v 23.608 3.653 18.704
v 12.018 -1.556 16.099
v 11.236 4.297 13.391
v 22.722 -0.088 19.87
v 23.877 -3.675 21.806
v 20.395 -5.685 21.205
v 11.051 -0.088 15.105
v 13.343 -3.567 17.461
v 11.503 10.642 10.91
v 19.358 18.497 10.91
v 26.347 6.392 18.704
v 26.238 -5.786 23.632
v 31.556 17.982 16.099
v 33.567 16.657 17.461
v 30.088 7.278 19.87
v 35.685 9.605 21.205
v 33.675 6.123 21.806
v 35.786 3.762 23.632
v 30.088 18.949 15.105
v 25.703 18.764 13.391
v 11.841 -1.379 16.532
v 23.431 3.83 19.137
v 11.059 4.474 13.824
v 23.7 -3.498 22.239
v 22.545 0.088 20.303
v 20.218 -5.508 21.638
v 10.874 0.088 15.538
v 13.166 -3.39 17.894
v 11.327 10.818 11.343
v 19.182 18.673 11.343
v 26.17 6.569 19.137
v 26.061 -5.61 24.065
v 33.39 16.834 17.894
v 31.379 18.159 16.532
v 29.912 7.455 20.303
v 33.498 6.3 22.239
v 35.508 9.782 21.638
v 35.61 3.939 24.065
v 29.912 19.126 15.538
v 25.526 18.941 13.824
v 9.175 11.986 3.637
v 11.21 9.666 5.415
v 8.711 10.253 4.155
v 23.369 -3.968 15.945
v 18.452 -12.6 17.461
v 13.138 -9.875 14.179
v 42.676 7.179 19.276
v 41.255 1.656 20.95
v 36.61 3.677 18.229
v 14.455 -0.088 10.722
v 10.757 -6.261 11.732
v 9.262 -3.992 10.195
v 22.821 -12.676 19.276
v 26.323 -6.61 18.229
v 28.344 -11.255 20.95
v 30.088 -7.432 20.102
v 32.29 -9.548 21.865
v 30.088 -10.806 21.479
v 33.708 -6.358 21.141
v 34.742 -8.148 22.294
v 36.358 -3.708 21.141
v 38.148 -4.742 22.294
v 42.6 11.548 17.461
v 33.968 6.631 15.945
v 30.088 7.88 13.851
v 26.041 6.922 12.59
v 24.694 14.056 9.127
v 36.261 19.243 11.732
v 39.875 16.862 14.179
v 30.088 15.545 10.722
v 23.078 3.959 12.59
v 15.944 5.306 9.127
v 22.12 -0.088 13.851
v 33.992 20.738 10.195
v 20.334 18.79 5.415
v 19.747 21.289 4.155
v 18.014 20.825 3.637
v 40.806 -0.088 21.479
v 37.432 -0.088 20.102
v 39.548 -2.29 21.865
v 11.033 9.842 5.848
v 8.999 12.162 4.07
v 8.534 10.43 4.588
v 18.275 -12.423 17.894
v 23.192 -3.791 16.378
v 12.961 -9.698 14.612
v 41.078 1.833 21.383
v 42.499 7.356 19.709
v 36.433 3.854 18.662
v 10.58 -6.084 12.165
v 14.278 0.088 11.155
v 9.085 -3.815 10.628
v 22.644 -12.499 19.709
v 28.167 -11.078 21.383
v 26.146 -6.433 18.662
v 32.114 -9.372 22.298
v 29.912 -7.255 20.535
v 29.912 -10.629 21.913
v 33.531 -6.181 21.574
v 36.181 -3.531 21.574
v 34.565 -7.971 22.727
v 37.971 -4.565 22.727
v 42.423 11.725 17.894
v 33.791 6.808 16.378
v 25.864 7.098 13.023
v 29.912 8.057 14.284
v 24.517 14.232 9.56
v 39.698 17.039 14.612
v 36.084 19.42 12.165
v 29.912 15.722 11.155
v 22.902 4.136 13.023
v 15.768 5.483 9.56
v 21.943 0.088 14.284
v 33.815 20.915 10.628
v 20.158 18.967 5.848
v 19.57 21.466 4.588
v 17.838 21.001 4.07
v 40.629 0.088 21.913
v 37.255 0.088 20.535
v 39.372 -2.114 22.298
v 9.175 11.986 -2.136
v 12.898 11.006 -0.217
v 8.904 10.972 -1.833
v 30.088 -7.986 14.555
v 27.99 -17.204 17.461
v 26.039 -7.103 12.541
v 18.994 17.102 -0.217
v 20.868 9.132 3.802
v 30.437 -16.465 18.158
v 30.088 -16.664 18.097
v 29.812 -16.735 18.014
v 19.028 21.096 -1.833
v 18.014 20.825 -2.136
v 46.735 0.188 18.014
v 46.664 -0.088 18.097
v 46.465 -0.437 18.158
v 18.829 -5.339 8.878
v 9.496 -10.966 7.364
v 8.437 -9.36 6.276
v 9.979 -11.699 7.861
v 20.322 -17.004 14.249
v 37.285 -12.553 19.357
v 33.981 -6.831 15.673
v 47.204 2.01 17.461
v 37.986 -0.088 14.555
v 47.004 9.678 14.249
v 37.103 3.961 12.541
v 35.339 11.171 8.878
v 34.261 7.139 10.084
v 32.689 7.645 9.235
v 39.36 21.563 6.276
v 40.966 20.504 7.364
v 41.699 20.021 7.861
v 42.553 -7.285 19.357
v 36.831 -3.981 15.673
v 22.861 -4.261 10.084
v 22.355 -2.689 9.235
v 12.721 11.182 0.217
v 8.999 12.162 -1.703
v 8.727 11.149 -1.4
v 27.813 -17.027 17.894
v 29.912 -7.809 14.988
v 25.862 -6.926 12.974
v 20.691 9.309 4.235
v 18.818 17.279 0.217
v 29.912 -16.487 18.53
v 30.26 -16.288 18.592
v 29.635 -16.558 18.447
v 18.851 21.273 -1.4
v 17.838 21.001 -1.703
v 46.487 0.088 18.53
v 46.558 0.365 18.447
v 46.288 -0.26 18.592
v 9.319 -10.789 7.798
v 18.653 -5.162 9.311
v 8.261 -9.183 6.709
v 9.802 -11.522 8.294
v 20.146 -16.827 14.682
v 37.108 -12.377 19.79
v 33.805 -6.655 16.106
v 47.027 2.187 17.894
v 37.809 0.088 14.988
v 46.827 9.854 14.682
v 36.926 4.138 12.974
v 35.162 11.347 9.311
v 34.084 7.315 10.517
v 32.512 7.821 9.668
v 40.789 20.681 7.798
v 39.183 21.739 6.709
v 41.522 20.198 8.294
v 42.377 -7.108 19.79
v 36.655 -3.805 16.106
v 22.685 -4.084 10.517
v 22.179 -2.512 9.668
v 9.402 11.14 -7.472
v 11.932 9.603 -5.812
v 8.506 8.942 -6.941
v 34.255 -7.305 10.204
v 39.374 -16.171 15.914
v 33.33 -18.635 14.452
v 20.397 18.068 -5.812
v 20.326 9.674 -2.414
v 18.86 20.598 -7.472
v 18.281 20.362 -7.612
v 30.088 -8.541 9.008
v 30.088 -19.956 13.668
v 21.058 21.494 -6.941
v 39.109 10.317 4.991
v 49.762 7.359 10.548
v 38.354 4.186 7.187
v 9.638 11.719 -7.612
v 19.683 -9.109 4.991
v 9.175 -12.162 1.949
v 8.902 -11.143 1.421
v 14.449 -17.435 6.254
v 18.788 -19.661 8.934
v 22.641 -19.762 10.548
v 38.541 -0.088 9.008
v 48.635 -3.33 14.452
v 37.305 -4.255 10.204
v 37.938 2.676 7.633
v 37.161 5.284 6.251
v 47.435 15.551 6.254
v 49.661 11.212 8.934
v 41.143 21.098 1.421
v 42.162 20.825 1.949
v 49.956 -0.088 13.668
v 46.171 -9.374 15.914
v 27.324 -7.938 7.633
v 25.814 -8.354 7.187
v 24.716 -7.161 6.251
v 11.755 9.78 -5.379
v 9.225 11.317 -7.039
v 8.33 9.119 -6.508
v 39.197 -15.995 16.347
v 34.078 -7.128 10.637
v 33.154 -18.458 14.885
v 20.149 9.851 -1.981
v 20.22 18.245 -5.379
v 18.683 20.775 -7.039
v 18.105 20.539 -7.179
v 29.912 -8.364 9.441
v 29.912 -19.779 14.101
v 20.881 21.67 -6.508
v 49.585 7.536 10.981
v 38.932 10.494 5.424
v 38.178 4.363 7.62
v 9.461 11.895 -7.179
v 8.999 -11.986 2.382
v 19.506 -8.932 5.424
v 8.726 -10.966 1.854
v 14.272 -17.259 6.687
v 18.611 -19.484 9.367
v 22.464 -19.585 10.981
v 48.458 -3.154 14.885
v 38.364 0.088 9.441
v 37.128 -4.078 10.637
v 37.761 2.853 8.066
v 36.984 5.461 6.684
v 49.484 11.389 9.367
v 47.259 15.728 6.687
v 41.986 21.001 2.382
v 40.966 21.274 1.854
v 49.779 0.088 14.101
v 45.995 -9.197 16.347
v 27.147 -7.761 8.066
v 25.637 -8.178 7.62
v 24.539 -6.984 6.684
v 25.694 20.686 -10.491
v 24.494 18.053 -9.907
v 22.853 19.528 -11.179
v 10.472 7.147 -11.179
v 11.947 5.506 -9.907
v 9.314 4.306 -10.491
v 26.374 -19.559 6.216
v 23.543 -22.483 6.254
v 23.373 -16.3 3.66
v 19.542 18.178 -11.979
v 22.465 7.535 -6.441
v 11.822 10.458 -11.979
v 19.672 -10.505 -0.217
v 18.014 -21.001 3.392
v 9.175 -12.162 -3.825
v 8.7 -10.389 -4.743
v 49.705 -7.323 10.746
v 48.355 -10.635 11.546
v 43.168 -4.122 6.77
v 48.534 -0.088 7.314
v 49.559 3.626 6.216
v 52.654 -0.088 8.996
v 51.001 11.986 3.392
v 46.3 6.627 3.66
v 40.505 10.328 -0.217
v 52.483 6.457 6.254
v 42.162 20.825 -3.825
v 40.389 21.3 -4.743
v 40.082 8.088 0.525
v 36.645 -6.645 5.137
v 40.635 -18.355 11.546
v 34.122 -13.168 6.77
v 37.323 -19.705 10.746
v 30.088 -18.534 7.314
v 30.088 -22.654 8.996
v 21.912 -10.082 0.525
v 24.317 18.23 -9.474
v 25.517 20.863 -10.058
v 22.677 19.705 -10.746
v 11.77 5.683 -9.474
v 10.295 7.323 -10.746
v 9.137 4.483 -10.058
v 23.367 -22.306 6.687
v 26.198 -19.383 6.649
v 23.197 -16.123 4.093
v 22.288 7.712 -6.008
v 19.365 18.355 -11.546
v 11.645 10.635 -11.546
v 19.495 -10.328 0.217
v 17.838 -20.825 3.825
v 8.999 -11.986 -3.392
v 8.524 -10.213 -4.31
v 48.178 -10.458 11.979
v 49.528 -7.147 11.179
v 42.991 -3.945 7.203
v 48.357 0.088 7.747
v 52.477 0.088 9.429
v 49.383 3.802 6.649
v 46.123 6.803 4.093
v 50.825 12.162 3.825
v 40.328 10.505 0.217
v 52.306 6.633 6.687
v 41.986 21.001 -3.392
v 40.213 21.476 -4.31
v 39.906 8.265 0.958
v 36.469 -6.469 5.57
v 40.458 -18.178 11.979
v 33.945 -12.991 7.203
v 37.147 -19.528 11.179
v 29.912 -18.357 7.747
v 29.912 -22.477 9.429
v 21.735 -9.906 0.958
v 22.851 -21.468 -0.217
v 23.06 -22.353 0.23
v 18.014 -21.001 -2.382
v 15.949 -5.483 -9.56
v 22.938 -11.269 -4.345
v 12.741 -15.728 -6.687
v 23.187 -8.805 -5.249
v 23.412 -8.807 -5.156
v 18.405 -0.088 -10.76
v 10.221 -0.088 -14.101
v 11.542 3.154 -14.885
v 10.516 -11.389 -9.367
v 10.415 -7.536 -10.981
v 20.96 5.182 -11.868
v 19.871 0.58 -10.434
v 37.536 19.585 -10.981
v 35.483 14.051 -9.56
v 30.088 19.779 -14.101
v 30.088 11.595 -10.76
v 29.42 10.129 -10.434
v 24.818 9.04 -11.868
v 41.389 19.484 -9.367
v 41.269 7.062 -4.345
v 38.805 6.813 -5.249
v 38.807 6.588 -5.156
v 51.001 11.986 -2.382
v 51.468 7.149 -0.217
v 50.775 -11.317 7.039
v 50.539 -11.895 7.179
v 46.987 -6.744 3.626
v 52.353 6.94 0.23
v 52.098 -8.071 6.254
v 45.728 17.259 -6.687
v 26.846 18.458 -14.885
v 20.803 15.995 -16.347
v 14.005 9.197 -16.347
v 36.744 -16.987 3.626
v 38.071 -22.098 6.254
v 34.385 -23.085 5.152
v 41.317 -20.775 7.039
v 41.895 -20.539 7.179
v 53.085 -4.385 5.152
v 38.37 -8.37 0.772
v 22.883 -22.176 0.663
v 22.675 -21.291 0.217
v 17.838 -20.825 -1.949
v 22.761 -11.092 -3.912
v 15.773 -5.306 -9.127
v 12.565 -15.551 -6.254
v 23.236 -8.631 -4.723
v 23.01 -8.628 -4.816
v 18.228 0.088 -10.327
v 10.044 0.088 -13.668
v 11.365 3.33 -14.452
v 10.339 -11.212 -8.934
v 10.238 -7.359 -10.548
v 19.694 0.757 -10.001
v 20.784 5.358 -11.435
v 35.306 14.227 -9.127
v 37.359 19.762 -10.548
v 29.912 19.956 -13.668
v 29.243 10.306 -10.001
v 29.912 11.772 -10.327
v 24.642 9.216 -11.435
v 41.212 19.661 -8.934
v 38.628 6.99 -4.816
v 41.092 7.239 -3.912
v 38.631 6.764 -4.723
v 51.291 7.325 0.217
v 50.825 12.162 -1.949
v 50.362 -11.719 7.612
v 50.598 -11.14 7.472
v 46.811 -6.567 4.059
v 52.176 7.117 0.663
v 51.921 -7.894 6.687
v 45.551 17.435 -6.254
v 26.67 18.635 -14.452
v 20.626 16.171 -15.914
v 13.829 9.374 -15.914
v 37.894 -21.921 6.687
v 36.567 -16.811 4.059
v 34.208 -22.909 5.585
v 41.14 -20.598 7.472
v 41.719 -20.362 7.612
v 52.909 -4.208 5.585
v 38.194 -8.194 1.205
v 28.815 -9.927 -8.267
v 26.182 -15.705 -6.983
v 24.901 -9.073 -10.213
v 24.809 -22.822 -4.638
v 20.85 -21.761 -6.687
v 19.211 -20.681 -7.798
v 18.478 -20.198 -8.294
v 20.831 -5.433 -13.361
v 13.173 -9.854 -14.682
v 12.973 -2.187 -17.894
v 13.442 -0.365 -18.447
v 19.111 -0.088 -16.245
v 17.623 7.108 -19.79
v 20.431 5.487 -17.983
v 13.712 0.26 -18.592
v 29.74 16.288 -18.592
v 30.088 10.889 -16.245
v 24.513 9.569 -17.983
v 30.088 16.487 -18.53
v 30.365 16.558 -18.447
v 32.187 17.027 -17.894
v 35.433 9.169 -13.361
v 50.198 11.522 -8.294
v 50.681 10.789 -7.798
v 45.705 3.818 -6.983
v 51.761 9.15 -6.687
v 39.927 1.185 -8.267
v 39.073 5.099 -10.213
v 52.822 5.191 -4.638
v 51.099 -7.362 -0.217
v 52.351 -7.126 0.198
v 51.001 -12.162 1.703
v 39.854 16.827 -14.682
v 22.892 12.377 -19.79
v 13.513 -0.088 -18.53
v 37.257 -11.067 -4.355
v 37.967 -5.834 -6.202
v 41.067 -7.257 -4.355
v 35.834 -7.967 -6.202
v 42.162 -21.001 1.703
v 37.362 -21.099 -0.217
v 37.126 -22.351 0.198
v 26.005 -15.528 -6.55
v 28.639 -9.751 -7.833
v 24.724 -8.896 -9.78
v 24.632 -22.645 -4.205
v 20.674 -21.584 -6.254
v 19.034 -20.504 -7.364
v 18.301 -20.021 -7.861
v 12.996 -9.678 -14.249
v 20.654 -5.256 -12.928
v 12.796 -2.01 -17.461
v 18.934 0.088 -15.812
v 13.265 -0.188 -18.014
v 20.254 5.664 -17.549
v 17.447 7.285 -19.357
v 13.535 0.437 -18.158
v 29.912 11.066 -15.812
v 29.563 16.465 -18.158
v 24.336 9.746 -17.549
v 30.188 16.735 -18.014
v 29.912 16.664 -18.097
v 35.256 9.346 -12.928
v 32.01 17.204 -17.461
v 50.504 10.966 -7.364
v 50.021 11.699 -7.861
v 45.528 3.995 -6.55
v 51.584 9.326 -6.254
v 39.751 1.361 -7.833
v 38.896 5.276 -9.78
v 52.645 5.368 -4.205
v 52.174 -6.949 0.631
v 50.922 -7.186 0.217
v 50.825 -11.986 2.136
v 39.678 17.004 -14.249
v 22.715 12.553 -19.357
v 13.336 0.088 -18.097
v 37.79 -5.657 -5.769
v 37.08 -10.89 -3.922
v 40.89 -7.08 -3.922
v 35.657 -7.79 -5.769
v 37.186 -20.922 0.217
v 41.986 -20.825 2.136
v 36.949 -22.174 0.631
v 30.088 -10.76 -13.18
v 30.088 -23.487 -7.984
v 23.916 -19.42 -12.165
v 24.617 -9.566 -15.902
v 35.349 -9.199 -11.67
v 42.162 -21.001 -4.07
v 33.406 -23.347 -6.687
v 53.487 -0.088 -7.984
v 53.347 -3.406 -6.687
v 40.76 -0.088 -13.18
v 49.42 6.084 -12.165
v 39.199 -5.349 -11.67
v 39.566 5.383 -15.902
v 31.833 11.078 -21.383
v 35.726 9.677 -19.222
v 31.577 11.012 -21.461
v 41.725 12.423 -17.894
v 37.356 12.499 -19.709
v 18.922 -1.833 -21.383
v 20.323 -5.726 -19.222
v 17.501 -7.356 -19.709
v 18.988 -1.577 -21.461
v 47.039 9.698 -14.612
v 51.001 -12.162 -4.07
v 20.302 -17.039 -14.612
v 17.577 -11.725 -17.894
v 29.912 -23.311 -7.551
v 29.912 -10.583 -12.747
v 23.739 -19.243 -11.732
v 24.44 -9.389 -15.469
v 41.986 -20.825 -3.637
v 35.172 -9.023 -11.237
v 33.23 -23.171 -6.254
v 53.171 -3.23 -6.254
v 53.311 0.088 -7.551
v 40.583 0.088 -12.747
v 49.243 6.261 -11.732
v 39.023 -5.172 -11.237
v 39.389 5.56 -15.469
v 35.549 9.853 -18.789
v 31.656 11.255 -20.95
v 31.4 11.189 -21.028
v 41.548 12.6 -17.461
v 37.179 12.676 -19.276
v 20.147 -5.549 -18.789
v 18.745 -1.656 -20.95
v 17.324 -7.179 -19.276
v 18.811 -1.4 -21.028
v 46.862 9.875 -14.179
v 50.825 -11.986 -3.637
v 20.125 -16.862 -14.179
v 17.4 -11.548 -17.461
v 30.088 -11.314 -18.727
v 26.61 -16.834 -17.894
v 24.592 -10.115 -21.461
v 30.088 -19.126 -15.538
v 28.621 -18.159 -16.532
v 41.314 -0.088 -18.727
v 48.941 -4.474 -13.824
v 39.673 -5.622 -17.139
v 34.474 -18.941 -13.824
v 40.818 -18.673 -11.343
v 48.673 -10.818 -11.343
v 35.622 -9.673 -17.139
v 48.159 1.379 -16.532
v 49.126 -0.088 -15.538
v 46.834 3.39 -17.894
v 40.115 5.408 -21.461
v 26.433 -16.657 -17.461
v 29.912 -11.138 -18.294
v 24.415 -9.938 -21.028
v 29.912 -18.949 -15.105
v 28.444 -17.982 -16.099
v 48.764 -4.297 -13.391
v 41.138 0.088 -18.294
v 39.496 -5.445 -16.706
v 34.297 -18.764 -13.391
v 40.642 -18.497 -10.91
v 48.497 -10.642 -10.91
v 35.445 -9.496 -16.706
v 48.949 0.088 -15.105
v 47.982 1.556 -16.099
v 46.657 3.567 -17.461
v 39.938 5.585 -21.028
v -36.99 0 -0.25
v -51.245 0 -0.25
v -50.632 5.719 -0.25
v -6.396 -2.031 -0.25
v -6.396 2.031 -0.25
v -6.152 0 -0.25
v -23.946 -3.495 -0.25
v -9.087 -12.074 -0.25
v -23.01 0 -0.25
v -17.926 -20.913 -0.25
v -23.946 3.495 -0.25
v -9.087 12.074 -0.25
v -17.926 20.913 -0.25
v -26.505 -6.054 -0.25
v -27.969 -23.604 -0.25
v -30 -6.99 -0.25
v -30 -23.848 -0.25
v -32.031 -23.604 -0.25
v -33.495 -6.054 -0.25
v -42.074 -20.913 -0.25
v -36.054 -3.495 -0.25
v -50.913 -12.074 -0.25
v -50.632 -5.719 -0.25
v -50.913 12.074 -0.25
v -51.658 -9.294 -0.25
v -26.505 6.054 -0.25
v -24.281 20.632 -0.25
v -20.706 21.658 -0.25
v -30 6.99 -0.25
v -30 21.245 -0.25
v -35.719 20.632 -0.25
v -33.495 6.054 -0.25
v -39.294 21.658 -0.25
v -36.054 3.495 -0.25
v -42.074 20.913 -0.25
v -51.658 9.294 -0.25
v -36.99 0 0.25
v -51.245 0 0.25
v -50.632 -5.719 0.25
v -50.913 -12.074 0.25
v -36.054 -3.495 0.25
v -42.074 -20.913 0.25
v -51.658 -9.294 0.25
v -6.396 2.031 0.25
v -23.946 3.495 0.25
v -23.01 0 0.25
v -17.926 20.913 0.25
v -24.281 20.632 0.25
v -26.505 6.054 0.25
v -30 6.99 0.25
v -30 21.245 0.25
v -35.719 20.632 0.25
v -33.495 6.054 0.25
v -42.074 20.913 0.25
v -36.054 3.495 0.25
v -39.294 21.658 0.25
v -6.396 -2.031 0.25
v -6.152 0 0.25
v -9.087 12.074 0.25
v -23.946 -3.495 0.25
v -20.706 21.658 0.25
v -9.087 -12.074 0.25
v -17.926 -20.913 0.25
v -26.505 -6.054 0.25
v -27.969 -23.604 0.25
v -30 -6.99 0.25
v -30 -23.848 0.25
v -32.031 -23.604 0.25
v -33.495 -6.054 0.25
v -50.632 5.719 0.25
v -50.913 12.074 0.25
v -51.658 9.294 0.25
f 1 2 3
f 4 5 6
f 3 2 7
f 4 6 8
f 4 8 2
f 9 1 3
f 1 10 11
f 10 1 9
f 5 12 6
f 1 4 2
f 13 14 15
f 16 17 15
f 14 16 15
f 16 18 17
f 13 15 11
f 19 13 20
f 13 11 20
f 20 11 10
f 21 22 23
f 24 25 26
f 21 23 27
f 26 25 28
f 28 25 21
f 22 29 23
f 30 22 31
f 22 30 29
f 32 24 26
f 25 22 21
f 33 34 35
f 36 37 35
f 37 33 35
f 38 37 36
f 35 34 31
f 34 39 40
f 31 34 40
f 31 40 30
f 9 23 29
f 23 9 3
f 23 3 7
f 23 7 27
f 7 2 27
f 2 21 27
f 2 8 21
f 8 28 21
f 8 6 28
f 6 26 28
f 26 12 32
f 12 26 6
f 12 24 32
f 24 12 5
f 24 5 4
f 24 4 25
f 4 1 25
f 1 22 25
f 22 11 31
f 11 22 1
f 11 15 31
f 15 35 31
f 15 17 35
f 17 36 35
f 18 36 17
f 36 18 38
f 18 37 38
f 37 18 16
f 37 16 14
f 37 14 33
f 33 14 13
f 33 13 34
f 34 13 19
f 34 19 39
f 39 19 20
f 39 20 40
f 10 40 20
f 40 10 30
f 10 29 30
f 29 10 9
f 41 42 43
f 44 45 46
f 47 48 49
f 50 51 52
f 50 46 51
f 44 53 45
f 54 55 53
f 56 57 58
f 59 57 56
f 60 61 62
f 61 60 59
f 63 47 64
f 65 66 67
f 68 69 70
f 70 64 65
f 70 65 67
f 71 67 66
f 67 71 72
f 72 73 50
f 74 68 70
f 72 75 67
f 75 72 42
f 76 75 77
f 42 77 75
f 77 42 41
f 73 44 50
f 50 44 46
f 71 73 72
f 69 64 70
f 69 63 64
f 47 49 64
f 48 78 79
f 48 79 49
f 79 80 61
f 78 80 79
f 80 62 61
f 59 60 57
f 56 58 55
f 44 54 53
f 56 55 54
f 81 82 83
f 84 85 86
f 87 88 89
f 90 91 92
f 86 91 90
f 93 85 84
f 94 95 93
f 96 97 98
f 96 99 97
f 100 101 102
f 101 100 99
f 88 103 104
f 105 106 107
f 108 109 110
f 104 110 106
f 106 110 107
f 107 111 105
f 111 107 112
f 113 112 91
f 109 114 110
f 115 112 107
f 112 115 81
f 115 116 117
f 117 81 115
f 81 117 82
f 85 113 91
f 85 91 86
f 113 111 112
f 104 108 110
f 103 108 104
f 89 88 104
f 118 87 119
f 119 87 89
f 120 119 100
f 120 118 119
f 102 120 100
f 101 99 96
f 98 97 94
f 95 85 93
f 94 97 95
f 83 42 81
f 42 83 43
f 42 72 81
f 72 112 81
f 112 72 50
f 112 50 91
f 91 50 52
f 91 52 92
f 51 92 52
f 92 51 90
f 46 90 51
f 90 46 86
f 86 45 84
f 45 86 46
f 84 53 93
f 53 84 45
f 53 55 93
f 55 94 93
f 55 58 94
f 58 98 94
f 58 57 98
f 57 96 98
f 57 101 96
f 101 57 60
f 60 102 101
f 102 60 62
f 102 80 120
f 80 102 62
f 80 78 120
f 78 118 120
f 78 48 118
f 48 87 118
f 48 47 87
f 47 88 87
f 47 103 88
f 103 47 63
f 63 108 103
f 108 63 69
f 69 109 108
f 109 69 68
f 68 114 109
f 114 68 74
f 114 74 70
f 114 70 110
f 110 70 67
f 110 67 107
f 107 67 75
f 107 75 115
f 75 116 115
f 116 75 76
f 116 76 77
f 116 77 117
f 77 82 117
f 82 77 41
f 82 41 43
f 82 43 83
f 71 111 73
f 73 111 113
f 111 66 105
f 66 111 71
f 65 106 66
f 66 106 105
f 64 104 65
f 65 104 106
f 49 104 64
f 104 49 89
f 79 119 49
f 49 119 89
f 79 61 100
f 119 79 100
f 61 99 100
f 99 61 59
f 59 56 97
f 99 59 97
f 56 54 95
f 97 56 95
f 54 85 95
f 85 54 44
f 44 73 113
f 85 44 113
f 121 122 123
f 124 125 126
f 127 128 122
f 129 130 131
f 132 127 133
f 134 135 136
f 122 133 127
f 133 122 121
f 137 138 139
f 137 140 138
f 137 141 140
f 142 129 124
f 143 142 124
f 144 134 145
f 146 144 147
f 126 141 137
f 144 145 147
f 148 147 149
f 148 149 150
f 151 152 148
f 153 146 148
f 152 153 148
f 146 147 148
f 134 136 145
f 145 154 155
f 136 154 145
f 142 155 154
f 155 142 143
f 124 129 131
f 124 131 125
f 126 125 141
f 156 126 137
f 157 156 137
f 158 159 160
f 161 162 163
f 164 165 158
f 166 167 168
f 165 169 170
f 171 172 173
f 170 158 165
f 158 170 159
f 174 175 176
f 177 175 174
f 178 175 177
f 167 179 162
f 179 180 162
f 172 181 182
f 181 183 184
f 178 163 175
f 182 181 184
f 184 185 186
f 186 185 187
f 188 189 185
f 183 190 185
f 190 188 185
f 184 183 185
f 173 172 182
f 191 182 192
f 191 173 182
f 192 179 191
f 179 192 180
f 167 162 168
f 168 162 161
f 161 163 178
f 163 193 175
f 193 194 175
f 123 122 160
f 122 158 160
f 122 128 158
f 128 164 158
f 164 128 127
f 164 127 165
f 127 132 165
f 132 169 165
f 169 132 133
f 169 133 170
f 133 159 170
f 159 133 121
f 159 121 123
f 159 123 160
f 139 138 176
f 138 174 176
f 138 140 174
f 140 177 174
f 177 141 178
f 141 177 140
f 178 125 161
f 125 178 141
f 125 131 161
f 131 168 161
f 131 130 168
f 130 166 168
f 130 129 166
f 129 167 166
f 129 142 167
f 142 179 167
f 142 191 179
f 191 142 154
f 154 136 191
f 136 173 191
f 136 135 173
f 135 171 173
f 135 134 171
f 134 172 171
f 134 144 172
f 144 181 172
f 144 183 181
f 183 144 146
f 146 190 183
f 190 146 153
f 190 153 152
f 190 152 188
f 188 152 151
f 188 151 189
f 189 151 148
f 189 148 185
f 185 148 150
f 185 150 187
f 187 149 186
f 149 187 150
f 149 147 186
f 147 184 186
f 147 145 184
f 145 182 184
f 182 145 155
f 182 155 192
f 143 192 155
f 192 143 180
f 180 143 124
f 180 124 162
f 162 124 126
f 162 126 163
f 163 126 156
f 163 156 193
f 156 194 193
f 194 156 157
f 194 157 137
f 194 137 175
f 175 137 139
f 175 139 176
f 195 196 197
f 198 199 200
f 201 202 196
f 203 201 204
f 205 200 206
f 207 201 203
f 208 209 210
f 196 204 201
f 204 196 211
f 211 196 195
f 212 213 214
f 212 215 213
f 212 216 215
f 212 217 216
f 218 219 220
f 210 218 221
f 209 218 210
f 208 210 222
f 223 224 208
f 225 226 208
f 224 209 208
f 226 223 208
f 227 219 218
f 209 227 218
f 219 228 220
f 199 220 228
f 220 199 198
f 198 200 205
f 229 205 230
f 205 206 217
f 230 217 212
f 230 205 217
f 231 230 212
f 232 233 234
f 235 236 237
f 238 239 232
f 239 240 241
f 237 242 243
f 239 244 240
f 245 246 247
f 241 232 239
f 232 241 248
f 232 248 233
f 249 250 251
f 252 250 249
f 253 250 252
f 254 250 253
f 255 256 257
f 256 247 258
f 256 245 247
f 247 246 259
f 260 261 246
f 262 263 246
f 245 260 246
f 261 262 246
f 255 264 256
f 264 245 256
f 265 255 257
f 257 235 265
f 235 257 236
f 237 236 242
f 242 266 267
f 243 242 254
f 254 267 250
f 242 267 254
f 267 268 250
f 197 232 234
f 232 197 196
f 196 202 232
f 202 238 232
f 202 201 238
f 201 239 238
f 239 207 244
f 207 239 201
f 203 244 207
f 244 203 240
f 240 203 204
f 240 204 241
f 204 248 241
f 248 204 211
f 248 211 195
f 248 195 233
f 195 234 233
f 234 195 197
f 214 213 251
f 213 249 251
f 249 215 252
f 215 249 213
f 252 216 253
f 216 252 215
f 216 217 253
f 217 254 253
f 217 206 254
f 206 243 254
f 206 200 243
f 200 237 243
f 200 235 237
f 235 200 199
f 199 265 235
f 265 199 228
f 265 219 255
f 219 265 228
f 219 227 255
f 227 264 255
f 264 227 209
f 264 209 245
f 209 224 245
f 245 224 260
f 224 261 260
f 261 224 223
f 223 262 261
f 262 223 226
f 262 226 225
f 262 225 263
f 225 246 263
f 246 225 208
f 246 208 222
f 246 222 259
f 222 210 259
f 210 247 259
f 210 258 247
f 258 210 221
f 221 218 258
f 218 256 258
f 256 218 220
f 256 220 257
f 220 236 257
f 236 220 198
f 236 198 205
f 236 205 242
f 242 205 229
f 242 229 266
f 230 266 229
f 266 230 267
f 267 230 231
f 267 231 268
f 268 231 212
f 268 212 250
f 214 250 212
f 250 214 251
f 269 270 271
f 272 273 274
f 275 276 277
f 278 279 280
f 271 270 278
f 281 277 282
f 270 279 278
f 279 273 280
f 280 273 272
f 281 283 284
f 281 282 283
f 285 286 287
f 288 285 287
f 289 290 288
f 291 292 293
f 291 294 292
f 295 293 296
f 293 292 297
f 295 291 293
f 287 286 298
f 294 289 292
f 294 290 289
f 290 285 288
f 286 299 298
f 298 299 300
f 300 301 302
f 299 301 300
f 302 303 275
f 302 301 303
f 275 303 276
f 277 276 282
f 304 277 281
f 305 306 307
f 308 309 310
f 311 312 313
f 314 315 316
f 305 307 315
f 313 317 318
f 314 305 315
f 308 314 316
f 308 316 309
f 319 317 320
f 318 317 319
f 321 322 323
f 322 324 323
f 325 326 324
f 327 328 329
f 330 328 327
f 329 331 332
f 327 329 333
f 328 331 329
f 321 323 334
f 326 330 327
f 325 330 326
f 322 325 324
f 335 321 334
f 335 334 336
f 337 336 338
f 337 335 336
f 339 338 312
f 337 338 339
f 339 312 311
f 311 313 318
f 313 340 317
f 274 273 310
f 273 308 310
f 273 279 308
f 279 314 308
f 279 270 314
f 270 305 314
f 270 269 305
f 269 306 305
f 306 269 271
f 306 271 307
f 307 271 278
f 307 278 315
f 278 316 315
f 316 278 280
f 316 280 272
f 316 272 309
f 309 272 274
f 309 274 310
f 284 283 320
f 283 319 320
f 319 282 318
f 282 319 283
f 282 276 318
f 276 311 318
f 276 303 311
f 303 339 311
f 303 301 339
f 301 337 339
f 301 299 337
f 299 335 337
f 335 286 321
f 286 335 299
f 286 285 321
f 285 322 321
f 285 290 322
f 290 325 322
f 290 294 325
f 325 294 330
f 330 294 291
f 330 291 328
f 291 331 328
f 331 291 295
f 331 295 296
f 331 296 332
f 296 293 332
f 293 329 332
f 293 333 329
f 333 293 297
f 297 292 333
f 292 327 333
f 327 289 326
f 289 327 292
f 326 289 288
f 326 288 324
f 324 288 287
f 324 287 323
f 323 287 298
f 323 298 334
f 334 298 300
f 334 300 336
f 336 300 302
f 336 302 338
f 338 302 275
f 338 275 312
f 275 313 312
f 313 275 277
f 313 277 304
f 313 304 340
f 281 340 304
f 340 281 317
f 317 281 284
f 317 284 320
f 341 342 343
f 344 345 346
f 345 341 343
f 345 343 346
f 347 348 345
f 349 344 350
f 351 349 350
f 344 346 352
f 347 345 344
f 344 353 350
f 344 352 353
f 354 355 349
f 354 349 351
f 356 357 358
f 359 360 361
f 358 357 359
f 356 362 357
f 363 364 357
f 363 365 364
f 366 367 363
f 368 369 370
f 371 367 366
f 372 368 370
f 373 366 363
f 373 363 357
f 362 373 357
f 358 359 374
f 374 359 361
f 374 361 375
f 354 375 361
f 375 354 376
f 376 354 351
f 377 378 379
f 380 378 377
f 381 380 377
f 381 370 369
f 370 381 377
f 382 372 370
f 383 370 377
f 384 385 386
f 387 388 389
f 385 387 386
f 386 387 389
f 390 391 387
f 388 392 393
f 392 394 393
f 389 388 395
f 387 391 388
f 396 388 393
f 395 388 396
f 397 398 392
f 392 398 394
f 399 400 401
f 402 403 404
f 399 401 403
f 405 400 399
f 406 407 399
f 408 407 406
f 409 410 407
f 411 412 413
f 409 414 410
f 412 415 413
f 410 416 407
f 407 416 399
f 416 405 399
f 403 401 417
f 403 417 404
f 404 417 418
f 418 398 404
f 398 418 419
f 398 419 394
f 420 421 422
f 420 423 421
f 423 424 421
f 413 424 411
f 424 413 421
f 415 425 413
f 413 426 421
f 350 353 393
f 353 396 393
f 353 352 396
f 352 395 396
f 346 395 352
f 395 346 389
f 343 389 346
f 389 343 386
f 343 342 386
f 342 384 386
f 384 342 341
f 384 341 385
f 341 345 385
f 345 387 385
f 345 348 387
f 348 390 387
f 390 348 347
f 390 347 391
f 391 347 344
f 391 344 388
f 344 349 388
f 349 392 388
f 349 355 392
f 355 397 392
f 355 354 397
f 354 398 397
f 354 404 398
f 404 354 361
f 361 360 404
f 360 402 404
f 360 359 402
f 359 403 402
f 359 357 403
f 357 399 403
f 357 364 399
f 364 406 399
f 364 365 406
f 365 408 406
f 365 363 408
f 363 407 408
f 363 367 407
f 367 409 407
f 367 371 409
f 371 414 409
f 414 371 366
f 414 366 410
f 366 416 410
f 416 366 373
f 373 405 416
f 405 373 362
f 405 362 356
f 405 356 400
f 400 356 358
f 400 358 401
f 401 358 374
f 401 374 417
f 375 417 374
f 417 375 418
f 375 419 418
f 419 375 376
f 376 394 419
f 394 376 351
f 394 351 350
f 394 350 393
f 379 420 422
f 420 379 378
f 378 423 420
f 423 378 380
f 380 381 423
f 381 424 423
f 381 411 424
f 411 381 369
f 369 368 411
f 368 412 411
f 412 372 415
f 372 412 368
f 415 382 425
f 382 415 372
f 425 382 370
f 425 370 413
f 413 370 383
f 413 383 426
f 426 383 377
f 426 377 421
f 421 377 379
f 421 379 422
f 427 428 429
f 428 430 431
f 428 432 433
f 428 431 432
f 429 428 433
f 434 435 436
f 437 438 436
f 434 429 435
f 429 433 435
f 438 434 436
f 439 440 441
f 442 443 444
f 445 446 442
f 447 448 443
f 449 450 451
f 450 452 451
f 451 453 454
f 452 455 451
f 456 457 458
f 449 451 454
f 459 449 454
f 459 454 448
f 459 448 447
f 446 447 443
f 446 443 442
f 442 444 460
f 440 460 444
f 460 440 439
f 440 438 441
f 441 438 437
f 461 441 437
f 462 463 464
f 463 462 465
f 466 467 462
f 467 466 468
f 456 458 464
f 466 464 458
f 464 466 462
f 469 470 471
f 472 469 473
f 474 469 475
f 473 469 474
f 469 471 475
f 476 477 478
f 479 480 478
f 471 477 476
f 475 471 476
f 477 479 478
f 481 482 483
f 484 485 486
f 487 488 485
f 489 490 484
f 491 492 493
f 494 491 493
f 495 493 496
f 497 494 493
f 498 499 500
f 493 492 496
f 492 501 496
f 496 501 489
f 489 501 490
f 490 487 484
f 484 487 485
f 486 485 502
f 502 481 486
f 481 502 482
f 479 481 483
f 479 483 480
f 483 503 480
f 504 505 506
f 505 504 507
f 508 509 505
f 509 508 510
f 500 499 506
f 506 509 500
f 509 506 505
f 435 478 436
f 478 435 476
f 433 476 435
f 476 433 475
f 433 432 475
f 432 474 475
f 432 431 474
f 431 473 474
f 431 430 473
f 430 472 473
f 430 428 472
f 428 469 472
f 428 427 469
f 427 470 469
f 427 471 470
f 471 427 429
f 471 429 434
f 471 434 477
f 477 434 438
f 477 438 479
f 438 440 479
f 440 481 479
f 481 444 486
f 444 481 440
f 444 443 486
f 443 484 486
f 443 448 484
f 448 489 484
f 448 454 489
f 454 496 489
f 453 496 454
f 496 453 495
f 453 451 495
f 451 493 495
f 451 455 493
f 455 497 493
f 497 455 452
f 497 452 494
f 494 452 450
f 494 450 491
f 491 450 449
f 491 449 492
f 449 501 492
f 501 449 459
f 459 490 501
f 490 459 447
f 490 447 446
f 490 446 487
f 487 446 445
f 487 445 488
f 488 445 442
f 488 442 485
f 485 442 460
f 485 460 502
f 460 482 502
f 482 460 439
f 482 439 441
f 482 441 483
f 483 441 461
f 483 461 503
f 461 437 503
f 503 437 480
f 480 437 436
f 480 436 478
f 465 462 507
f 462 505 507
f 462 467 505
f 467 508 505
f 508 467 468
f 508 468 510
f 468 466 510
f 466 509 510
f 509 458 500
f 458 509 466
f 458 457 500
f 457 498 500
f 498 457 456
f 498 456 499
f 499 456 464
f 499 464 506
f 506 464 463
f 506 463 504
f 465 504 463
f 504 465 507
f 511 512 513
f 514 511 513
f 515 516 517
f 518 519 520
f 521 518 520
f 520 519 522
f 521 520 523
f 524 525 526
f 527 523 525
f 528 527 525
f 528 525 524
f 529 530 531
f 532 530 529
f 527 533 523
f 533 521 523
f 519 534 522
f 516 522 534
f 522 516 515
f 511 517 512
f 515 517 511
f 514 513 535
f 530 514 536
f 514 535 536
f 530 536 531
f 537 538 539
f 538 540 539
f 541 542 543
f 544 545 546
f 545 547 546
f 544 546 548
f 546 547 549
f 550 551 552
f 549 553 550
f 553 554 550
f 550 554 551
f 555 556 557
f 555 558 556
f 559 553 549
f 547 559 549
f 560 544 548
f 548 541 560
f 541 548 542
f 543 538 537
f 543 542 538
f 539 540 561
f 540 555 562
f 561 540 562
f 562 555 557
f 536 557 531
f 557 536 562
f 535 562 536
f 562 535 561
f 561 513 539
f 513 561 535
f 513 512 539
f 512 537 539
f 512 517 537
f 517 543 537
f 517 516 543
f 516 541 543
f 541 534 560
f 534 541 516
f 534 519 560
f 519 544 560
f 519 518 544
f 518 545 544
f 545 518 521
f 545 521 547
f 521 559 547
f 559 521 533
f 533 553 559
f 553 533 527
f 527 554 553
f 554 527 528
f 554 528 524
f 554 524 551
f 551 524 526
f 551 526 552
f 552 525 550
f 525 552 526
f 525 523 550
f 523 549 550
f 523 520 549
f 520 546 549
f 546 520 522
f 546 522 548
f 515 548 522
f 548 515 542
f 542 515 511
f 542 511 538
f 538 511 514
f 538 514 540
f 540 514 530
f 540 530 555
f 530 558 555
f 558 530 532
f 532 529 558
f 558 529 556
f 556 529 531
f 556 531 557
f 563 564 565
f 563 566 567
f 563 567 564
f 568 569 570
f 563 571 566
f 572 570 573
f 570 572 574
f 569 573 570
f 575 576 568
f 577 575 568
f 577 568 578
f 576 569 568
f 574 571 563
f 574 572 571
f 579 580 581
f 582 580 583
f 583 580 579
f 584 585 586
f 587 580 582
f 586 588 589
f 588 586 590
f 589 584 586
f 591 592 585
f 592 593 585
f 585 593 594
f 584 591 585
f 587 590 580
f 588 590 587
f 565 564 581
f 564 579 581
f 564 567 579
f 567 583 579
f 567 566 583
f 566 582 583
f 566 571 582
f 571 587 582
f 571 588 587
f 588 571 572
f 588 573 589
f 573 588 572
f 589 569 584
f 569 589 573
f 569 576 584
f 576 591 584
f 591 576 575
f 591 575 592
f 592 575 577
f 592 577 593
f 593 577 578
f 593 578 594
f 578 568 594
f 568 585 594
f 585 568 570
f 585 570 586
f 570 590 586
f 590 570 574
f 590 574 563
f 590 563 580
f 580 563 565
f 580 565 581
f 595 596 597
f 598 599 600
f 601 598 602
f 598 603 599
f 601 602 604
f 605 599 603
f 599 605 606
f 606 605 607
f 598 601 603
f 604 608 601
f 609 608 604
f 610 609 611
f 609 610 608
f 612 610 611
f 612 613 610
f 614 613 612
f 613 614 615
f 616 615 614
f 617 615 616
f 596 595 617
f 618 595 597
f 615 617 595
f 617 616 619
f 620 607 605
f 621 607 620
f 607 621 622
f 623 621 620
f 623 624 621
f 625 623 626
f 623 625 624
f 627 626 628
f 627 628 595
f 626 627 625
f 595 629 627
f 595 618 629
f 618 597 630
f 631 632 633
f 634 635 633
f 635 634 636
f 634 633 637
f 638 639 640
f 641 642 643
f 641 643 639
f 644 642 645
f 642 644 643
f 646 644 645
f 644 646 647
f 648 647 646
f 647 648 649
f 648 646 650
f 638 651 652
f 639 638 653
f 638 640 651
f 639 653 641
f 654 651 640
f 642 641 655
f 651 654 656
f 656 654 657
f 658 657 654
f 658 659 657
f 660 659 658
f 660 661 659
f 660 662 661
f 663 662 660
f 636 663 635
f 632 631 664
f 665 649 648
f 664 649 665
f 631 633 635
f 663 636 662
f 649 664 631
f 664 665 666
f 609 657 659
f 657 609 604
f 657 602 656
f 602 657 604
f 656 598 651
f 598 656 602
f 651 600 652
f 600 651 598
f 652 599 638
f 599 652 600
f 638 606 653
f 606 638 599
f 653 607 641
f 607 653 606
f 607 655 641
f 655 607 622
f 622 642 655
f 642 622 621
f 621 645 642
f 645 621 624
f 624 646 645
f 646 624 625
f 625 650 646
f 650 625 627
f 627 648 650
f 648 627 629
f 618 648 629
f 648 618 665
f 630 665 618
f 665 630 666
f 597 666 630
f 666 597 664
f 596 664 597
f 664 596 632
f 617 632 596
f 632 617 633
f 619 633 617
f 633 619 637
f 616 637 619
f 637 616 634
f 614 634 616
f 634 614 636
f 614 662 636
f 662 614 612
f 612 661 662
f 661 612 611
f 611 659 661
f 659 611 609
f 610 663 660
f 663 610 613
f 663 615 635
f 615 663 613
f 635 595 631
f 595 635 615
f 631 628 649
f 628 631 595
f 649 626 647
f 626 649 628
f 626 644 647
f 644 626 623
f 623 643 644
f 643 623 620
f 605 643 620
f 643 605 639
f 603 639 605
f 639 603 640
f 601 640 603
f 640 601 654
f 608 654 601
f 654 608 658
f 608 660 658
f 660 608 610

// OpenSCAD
// Volume: 3756.3284436245003, SurfaceArea: 15921.5537179351

module thing()
{
  $fa = 30;
  difference() {
    sphere(r = 25);
    cylinder(h = 62.5, r1 = 12.5, r2 = 6.25, center = true);
    rotate(90, [ 1, 0, 0 ]) cylinder(h = 62.5,
        r1 = 12.5, r2 = 6.25, center = true);
    rotate(90, [ 0, 1, 0 ]) cylinder(h = 62.5,
        r1 = 12.5, r2 = 6.25, center = true);
  }
}

module demo_proj()
{
  linear_extrude(center = true, height = 0.5) projection(cut = false) thing();
  % thing();
}

module demo_cut()
{
  for (i=[-20:5:+20]) {
     rotate(-30, [ 1, 1, 0 ]) translate([ 0, 0, -i ])
      linear_extrude(center = true, height = 0.5) projection(cut = true)
        translate([ 0, 0, i ]) rotate(+30, [ 1, 1, 0 ]) thing();
  }
  % thing();
}

echo(version=version());
translate([ -30, 0, 0 ]) demo_proj();
translate([ +30, 0, 0 ]) demo_cut();

// Written by Clifford Wolf <clifford@clifford.at> and Marius
// Kintel <marius@kintel.net>
//
// To the extent possible under law, the author(s) have dedicated all
// copyright and related and neighboring rights to this software to the
// public domain worldwide. This software is distributed without any
// warranty.
//
// You should have received a copy of the CC0 Public Domain
// Dedication along with this software.
// If not, see <http://creativecommons.org/publicdomain/zero/1.0/>.
